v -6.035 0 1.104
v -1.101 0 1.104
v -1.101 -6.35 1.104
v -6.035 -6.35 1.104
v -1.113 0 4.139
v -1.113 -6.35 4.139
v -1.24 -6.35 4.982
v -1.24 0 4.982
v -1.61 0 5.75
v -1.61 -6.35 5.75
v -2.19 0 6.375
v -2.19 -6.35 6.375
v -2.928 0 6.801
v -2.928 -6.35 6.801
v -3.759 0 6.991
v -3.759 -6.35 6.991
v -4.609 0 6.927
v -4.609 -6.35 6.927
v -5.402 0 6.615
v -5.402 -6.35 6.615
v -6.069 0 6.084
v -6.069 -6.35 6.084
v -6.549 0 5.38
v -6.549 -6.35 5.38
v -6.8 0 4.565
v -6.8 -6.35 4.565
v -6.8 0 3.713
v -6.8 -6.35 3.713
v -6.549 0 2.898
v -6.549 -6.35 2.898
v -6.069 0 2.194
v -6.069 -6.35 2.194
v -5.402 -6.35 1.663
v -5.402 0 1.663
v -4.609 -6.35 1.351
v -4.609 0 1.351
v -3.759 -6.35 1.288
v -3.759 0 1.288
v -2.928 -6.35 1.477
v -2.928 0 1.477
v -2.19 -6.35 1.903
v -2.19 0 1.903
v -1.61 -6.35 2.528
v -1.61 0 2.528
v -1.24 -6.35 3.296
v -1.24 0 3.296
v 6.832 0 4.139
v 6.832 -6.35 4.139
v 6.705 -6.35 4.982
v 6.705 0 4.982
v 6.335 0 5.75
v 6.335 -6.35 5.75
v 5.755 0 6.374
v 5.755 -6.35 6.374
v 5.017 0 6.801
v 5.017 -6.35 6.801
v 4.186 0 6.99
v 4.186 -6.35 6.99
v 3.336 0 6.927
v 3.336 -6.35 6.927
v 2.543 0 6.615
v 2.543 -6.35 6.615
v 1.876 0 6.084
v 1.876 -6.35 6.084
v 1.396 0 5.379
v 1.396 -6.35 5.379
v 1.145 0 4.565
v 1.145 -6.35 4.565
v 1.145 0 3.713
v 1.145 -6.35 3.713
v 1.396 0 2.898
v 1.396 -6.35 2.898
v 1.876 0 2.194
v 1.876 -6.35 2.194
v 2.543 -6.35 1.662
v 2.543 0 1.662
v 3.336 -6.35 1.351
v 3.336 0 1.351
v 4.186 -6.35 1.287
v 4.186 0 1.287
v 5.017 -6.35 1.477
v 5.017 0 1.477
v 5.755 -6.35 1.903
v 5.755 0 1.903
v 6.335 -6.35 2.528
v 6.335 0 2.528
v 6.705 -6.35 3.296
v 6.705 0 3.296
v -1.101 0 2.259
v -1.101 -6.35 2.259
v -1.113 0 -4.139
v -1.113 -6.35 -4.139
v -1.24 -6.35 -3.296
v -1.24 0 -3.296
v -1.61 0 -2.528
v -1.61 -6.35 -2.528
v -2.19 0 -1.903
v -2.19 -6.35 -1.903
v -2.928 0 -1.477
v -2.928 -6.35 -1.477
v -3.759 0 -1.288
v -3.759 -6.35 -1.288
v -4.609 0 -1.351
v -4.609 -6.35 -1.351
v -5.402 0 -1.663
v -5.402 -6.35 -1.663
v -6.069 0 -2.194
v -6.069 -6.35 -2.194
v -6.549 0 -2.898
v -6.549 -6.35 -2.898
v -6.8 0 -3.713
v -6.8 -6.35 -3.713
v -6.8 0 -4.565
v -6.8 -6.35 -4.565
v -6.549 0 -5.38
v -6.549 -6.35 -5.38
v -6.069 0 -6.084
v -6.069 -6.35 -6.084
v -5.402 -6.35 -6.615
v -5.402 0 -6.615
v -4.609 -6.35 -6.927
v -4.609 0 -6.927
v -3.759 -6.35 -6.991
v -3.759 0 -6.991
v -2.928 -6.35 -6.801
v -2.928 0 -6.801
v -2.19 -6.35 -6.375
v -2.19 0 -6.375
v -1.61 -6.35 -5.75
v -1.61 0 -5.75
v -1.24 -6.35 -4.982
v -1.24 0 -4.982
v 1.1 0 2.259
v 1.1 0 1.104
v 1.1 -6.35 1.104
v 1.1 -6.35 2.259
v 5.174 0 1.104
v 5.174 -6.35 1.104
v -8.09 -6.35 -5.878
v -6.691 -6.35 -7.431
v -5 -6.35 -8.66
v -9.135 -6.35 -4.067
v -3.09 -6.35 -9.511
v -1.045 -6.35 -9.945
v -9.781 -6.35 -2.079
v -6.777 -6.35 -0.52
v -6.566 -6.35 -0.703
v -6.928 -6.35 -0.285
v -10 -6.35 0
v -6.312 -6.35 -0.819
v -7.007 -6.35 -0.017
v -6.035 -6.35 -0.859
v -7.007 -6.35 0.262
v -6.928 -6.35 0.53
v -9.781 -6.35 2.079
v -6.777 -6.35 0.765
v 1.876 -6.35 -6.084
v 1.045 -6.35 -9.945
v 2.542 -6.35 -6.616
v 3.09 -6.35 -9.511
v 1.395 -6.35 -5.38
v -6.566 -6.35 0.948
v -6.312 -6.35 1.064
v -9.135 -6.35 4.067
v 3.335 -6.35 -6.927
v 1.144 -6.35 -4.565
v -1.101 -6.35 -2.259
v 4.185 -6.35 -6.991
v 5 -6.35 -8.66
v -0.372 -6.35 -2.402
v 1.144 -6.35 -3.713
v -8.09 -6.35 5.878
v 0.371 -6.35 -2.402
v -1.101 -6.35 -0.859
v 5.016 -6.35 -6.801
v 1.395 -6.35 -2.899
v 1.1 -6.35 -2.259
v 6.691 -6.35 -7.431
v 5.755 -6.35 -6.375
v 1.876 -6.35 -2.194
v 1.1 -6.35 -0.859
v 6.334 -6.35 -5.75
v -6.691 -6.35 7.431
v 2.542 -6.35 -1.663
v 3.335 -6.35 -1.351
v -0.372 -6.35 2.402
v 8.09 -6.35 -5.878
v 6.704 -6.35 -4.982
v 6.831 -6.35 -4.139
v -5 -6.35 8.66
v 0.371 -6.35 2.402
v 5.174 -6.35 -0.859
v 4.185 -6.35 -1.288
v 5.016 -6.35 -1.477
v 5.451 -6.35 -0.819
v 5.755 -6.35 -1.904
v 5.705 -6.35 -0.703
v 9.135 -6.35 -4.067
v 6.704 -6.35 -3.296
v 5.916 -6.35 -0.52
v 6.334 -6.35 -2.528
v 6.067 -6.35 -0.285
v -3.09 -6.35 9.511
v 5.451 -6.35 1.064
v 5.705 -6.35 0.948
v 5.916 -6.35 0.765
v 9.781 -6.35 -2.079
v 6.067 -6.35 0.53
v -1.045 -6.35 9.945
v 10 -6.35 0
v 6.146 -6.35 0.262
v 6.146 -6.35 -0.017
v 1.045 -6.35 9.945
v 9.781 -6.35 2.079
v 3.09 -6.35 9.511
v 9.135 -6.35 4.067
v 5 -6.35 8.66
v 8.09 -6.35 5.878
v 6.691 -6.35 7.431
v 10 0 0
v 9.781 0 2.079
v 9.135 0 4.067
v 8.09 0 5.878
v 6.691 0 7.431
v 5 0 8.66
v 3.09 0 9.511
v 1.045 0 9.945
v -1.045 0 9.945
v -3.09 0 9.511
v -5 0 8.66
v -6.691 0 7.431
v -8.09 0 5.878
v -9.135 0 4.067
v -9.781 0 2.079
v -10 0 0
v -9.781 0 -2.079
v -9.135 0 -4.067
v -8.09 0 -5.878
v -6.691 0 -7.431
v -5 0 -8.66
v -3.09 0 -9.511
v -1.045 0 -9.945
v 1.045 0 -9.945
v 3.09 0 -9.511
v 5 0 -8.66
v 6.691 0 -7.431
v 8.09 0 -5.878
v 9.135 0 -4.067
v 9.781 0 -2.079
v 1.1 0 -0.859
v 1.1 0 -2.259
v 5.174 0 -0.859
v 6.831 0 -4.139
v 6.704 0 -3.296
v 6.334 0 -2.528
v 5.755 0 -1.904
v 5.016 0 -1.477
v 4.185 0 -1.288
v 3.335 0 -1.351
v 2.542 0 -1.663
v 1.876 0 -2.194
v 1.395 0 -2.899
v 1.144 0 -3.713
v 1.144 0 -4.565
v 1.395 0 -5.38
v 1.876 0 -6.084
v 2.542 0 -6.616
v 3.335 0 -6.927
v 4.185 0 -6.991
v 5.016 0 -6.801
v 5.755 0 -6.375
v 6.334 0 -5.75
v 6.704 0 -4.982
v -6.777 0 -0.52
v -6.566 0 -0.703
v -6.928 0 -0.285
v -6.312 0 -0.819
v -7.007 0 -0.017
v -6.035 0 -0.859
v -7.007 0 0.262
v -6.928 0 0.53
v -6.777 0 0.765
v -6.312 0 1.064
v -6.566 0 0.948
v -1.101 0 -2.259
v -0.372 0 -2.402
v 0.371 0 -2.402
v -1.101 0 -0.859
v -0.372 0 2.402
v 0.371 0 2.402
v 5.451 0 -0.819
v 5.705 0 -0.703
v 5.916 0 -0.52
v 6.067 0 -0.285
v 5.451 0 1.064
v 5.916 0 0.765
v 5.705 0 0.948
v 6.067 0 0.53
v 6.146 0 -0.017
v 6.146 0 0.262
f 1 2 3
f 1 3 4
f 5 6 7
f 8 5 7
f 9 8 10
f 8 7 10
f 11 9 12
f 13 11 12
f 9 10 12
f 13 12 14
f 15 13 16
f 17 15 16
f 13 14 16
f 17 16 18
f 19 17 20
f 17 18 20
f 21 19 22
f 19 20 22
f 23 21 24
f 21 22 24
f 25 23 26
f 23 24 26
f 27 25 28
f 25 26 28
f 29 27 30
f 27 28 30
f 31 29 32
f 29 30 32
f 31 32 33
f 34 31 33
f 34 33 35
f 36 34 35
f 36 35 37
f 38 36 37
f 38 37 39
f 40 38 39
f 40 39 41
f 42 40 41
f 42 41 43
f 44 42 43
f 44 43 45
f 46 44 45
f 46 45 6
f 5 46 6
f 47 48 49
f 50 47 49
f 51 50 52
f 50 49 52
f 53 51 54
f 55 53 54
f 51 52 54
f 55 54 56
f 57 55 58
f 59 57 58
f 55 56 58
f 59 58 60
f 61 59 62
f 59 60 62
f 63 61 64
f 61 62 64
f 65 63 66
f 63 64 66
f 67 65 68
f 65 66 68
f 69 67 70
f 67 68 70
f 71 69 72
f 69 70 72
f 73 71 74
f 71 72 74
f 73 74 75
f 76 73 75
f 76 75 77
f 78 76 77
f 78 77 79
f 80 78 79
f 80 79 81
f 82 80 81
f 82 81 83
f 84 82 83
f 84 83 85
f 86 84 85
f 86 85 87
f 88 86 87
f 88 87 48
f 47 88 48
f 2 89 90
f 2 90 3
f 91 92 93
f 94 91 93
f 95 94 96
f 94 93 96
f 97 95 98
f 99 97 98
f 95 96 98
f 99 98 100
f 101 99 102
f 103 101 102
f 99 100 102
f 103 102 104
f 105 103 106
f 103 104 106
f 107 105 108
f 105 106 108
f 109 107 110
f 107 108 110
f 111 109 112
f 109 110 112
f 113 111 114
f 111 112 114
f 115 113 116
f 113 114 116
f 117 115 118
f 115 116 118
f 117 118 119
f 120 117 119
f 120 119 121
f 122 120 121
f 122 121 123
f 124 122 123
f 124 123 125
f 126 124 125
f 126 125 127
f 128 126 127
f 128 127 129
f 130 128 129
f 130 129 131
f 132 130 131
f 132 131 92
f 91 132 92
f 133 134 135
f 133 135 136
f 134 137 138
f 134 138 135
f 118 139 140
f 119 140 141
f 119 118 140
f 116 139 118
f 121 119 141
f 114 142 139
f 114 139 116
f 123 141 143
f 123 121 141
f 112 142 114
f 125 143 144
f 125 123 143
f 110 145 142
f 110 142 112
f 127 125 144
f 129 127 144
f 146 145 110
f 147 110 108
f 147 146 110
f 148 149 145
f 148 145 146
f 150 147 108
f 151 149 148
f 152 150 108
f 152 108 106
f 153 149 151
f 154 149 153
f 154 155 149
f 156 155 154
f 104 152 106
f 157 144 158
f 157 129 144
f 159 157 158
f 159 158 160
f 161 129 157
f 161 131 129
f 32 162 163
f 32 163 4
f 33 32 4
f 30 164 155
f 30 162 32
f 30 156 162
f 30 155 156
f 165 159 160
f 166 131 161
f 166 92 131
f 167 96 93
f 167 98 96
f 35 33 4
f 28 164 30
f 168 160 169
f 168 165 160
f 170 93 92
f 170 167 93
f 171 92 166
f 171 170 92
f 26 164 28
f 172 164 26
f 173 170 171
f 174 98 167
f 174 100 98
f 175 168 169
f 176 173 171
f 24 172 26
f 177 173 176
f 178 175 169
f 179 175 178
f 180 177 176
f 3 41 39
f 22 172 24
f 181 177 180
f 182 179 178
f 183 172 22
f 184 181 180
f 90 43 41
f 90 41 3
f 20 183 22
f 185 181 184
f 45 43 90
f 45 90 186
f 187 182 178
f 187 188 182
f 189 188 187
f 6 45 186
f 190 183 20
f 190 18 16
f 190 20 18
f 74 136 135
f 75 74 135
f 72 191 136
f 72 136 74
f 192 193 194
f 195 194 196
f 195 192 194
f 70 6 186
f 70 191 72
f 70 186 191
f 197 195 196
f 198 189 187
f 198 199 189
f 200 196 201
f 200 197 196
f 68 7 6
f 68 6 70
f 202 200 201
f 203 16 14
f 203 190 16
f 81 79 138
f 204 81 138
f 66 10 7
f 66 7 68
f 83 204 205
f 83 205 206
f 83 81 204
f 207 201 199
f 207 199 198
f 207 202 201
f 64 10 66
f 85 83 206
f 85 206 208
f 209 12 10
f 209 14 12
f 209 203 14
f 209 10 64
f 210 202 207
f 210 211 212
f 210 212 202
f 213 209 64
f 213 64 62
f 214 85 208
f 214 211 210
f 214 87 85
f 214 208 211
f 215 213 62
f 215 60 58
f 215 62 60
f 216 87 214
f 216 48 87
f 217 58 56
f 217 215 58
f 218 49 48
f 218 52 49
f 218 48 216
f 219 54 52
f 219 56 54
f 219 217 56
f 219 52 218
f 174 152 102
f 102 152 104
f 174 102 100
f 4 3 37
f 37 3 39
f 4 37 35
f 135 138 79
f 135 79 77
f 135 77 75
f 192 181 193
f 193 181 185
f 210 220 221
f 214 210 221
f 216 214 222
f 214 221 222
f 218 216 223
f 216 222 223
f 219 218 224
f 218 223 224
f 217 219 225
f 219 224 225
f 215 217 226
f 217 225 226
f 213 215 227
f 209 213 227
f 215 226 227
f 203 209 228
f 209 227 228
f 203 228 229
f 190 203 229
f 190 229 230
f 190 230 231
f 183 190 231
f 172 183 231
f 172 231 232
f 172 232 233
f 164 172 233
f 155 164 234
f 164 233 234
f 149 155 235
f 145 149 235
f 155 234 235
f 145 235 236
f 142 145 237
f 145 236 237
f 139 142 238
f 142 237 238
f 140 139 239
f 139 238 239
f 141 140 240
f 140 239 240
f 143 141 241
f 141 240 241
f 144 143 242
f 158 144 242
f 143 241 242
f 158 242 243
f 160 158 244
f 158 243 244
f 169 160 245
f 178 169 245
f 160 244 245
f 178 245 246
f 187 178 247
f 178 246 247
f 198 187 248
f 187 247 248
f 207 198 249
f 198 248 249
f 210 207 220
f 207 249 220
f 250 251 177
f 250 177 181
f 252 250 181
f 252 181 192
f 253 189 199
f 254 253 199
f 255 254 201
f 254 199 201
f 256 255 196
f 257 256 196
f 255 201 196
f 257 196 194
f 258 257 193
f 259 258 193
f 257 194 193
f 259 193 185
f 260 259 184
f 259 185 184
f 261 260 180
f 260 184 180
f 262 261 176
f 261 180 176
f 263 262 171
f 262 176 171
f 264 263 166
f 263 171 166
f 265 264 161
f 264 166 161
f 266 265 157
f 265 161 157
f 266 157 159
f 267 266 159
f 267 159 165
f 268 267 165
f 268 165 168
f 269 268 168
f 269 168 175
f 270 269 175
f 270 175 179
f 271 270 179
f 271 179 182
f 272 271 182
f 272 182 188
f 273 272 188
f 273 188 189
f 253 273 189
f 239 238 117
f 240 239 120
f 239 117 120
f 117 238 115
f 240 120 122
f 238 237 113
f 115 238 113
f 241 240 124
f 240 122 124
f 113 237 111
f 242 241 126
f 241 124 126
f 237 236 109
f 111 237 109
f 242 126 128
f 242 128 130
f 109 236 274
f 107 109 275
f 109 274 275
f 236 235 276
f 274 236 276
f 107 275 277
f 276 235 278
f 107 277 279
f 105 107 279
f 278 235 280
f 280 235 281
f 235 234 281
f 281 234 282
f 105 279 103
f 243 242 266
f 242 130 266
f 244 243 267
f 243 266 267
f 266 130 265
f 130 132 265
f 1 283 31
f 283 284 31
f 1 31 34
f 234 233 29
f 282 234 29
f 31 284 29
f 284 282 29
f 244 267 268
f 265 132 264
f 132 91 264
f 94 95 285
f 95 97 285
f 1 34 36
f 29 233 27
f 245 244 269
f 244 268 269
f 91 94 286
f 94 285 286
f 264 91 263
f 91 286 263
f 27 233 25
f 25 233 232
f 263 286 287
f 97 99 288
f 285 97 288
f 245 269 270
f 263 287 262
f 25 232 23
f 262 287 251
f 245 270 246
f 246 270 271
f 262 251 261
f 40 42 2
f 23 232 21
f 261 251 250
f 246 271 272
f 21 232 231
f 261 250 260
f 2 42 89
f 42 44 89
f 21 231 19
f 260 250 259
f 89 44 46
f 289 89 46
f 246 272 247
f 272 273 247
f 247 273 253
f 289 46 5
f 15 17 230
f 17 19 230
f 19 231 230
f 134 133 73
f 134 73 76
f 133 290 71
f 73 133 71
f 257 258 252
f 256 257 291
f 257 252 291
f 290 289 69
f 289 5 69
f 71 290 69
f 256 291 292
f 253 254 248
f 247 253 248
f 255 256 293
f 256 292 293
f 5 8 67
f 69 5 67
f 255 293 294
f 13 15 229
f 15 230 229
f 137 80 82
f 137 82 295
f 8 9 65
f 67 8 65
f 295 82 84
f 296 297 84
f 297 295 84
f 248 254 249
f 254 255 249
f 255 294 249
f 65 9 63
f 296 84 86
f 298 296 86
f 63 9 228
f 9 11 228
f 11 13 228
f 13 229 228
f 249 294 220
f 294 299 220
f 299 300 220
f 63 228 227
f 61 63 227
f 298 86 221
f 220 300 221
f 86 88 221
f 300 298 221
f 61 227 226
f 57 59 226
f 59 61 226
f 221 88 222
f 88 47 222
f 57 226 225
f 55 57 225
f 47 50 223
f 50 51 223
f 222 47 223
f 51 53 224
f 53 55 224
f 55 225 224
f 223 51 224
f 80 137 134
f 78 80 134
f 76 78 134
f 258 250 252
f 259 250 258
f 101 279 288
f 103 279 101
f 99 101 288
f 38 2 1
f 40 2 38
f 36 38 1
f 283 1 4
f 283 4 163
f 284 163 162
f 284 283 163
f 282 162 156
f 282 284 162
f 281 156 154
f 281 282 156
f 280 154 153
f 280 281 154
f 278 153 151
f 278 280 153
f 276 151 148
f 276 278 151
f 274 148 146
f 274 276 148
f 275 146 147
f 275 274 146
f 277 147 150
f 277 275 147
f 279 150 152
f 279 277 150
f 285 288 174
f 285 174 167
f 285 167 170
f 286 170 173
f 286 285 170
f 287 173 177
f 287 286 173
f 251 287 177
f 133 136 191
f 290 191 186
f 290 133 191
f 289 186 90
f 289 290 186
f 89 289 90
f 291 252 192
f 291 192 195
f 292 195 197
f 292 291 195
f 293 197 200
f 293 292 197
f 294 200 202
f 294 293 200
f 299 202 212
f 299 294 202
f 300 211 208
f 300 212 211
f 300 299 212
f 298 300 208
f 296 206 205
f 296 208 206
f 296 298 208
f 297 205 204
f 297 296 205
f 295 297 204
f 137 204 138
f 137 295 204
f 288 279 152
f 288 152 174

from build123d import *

# Parameters (mm, degrees)
F0_R     = 10
F1_DEPTH = 6.35
F3_DEPTH = 25.4
F5_DEPTH = 25.4
F6_R     = 2.859513
F7_DEPTH = 25.4


with BuildPart() as f1:
    # F0 (on Front) → F1 (new body)
    with BuildSketch(Plane.XZ):
        Circle(F0_R)
    extrude(amount=F1_DEPTH)

    # F2 (on Front) → F3 (cut)
    with BuildSketch(Plane.XZ):
        with BuildLine():
            Line((5.17427, 1.104157), (-6.035211, 1.104157))
            ThreePointArc((-6.035211, 1.104157), (-7.016857, 0.122512), (-6.035211, -0.859134))
            Line((-6.035211, -0.859134), (5.17427, -0.859134))
            ThreePointArc((5.17427, -0.859134), (6.155916, 0.122512), (5.17427, 1.104157))
        make_face()
    extrude(amount=F3_DEPTH, mode=Mode.SUBTRACT)

    # F4 (on Front) → F5 (cut)
    with BuildSketch(Plane.XZ):
        with BuildLine():
            Line((1.099834, -2.258694), (1.099834, 0))
            Line((1.099834, 0), (1.099834, 2.258694))
            ThreePointArc((1.099834, 2.258694), (-0.000652, 2.419633), (-1.101137, 2.258694))
            Line((-1.101137, 2.258694), (-1.101137, 0))
            Line((-1.101137, 0), (-1.101137, -2.258694))
            ThreePointArc((-1.101137, -2.258694), (-0.000652, -2.419633), (1.099834, -2.258694))
        make_face()
    extrude(amount=F5_DEPTH, mode=Mode.SUBTRACT)

    # F6 (on face) → F7 (cut)
    with BuildSketch(Plane.XZ.offset(6.35)):
        with Locations((-3.97266, 4.139036)):
            Circle(F6_R)
        with Locations((-3.97266, -4.139036)):
            Circle(F6_R)
        with Locations((3.972278, 4.138778)):
            Circle(F6_R)
        with Locations((3.971739, -4.139295)):
            Circle(F6_R)
    extrude(amount=-F7_DEPTH, mode=Mode.SUBTRACT)


solid = f1.part
